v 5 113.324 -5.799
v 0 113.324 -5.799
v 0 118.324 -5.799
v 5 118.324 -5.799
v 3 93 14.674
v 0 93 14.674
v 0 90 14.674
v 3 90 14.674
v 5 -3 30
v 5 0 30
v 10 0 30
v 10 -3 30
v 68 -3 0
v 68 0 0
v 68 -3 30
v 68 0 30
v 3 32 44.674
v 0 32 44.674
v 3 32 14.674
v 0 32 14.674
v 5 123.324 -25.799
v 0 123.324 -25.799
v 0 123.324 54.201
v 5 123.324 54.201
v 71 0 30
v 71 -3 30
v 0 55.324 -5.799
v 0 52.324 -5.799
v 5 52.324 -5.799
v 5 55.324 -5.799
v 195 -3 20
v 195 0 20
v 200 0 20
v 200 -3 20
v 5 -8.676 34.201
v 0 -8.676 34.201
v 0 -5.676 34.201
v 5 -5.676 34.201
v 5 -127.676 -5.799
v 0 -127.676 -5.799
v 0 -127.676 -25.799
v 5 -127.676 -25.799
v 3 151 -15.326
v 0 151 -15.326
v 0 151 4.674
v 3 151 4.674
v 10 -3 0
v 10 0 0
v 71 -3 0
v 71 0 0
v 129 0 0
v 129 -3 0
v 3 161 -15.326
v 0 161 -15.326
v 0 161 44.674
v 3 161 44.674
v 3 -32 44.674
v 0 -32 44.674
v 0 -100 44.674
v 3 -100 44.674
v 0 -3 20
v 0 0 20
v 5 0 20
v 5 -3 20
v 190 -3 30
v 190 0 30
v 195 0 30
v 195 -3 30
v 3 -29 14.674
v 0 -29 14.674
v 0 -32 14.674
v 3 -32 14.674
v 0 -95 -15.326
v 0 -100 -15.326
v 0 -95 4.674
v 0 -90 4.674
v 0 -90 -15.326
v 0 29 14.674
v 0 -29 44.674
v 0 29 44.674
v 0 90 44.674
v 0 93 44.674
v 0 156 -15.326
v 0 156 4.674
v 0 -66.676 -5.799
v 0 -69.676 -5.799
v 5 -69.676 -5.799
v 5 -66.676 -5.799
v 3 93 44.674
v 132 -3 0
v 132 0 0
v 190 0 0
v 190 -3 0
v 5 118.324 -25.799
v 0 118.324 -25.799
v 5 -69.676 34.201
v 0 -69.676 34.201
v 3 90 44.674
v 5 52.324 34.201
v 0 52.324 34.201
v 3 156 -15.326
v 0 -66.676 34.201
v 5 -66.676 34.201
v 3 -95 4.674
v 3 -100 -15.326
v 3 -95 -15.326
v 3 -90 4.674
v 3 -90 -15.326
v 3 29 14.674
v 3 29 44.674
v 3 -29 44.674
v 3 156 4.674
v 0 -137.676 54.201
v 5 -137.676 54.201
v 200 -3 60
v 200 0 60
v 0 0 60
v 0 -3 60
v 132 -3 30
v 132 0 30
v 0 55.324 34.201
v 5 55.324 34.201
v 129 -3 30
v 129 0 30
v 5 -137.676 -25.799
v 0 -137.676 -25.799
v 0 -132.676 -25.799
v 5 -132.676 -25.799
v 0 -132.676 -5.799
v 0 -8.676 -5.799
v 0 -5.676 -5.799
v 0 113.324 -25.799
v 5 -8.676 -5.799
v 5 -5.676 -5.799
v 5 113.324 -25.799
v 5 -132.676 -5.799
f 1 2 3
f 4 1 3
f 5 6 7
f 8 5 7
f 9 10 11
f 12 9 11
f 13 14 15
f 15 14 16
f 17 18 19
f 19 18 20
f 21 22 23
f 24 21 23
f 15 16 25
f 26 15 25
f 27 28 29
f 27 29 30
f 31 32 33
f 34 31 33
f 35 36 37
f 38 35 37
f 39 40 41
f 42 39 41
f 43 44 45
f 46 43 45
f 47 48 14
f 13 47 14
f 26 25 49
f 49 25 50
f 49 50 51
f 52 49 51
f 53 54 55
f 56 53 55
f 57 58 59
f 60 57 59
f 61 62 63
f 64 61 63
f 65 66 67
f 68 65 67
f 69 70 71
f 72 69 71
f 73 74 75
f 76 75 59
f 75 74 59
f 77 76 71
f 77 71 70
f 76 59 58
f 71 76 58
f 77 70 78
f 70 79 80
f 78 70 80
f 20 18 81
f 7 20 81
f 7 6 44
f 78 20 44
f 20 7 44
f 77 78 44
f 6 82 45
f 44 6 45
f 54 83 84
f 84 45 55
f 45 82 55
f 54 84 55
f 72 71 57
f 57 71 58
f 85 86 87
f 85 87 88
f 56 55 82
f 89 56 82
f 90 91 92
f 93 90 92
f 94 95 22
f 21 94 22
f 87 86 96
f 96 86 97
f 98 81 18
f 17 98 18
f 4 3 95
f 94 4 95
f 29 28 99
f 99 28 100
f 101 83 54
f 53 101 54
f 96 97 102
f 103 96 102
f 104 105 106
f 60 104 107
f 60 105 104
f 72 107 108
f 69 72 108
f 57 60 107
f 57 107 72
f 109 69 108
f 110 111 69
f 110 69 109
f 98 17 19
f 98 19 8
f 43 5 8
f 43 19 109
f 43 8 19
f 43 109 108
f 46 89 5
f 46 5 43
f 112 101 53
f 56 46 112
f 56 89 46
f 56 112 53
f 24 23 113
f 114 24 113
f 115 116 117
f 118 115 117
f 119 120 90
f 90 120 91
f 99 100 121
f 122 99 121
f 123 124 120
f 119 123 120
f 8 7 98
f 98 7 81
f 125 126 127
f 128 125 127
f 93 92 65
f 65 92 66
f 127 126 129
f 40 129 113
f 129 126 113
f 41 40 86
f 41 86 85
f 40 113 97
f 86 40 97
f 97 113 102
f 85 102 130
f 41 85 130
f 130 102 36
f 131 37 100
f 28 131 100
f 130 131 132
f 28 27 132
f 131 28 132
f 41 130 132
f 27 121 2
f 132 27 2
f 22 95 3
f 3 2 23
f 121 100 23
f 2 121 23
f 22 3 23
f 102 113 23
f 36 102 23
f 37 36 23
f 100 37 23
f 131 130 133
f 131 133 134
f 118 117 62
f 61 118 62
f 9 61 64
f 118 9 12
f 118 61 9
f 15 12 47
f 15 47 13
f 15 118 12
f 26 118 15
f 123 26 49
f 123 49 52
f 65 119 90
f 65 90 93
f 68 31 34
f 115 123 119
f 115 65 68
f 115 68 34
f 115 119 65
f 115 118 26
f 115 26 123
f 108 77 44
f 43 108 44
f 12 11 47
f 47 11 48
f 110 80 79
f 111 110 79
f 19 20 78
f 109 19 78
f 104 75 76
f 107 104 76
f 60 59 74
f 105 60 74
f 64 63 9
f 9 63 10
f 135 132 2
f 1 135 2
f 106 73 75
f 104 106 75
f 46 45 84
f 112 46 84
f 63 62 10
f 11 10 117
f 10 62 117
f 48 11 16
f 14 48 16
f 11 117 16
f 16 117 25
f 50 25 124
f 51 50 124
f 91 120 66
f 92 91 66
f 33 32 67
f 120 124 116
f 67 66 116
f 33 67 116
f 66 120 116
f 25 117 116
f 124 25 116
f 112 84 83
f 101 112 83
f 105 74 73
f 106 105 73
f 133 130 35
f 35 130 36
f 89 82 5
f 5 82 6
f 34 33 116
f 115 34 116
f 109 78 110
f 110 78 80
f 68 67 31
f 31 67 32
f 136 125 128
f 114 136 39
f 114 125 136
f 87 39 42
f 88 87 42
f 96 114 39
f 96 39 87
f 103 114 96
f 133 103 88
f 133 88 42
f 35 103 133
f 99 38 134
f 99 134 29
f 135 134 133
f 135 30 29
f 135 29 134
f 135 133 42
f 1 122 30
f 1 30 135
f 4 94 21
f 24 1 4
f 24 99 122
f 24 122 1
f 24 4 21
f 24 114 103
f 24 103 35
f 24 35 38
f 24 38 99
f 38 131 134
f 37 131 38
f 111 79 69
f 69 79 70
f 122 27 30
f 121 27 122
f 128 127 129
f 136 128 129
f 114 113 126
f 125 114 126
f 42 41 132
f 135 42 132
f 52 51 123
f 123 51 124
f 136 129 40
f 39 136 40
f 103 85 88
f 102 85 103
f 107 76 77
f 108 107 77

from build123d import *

# Parameters (mm, degrees)
F1_DEPTH = 3
F3_DEPTH = 3
F4_W     = 3
F4_H     = 40
F5_DEPTH = 5


with BuildPart() as f1:
    # F0 (on Front) → F1 (new body)
    with BuildSketch(Plane.XZ):
        Polygon((0, 60), (0, 20), (5, 20), (5, 30), (10, 30), (10, 0), (68, 0), (68, 30), (71, 30), (71, 0), (129, 0), (129, 30), (132, 30), (132, 0), (190, 0), (190, 30), (195, 30), (195, 20), (200, 20), (200, 60), align=None)
    extrude(amount=F1_DEPTH)


with BuildPart() as f3:
    # F2 (on Right) → F3 (new body)
    with BuildSketch(Plane.YZ):
        Polygon((-100, 44.673787), (-100, -15.326213), (-95, -15.326213), (-95, 4.673787), (-90, 4.673787), (-90, -15.326213), (151, -15.326213), (151, 4.673787), (156, 4.673787), (156, -15.326213), (161, -15.326213), (161, 44.673787), (93, 44.673787), (93, 14.673787), (90, 14.673787), (90, 44.673787), (32, 44.673787), (32, 14.673787), (29, 14.673787), (29, 44.673787), (-29, 44.673787), (-29, 14.673787), (-32, 14.673787), (-32, 44.673787), align=None)
    extrude(amount=F3_DEPTH)


with BuildPart() as f5:
    # F4 (on Right) → F5 (new body)
    with BuildSketch(Plane.YZ):
        Polygon((118.323529, -25.799315), (123.323529, -25.799315), (123.323529, 54.200685), (-137.676471, 54.200685), (-137.676471, -25.799315), (-132.676471, -25.799315), (-132.676471, -5.799315), (-127.676471, -5.799315), (-127.676471, -25.799315), (113.323529, -25.799315), (113.323529, -5.799315), (118.323529, -5.799315), align=None)
        with Locations((-68.176471, 14.200685)):
            Rectangle(F4_W, F4_H, mode=Mode.SUBTRACT)
        with Locations((-7.176471, 14.200685)):
            Rectangle(F4_W, F4_H, mode=Mode.SUBTRACT)
        with Locations((53.823529, 14.200685)):
            Rectangle(F4_W, F4_H, mode=Mode.SUBTRACT)
    extrude(amount=F5_DEPTH)


solid = Compound([f1.part, f3.part, f5.part])
